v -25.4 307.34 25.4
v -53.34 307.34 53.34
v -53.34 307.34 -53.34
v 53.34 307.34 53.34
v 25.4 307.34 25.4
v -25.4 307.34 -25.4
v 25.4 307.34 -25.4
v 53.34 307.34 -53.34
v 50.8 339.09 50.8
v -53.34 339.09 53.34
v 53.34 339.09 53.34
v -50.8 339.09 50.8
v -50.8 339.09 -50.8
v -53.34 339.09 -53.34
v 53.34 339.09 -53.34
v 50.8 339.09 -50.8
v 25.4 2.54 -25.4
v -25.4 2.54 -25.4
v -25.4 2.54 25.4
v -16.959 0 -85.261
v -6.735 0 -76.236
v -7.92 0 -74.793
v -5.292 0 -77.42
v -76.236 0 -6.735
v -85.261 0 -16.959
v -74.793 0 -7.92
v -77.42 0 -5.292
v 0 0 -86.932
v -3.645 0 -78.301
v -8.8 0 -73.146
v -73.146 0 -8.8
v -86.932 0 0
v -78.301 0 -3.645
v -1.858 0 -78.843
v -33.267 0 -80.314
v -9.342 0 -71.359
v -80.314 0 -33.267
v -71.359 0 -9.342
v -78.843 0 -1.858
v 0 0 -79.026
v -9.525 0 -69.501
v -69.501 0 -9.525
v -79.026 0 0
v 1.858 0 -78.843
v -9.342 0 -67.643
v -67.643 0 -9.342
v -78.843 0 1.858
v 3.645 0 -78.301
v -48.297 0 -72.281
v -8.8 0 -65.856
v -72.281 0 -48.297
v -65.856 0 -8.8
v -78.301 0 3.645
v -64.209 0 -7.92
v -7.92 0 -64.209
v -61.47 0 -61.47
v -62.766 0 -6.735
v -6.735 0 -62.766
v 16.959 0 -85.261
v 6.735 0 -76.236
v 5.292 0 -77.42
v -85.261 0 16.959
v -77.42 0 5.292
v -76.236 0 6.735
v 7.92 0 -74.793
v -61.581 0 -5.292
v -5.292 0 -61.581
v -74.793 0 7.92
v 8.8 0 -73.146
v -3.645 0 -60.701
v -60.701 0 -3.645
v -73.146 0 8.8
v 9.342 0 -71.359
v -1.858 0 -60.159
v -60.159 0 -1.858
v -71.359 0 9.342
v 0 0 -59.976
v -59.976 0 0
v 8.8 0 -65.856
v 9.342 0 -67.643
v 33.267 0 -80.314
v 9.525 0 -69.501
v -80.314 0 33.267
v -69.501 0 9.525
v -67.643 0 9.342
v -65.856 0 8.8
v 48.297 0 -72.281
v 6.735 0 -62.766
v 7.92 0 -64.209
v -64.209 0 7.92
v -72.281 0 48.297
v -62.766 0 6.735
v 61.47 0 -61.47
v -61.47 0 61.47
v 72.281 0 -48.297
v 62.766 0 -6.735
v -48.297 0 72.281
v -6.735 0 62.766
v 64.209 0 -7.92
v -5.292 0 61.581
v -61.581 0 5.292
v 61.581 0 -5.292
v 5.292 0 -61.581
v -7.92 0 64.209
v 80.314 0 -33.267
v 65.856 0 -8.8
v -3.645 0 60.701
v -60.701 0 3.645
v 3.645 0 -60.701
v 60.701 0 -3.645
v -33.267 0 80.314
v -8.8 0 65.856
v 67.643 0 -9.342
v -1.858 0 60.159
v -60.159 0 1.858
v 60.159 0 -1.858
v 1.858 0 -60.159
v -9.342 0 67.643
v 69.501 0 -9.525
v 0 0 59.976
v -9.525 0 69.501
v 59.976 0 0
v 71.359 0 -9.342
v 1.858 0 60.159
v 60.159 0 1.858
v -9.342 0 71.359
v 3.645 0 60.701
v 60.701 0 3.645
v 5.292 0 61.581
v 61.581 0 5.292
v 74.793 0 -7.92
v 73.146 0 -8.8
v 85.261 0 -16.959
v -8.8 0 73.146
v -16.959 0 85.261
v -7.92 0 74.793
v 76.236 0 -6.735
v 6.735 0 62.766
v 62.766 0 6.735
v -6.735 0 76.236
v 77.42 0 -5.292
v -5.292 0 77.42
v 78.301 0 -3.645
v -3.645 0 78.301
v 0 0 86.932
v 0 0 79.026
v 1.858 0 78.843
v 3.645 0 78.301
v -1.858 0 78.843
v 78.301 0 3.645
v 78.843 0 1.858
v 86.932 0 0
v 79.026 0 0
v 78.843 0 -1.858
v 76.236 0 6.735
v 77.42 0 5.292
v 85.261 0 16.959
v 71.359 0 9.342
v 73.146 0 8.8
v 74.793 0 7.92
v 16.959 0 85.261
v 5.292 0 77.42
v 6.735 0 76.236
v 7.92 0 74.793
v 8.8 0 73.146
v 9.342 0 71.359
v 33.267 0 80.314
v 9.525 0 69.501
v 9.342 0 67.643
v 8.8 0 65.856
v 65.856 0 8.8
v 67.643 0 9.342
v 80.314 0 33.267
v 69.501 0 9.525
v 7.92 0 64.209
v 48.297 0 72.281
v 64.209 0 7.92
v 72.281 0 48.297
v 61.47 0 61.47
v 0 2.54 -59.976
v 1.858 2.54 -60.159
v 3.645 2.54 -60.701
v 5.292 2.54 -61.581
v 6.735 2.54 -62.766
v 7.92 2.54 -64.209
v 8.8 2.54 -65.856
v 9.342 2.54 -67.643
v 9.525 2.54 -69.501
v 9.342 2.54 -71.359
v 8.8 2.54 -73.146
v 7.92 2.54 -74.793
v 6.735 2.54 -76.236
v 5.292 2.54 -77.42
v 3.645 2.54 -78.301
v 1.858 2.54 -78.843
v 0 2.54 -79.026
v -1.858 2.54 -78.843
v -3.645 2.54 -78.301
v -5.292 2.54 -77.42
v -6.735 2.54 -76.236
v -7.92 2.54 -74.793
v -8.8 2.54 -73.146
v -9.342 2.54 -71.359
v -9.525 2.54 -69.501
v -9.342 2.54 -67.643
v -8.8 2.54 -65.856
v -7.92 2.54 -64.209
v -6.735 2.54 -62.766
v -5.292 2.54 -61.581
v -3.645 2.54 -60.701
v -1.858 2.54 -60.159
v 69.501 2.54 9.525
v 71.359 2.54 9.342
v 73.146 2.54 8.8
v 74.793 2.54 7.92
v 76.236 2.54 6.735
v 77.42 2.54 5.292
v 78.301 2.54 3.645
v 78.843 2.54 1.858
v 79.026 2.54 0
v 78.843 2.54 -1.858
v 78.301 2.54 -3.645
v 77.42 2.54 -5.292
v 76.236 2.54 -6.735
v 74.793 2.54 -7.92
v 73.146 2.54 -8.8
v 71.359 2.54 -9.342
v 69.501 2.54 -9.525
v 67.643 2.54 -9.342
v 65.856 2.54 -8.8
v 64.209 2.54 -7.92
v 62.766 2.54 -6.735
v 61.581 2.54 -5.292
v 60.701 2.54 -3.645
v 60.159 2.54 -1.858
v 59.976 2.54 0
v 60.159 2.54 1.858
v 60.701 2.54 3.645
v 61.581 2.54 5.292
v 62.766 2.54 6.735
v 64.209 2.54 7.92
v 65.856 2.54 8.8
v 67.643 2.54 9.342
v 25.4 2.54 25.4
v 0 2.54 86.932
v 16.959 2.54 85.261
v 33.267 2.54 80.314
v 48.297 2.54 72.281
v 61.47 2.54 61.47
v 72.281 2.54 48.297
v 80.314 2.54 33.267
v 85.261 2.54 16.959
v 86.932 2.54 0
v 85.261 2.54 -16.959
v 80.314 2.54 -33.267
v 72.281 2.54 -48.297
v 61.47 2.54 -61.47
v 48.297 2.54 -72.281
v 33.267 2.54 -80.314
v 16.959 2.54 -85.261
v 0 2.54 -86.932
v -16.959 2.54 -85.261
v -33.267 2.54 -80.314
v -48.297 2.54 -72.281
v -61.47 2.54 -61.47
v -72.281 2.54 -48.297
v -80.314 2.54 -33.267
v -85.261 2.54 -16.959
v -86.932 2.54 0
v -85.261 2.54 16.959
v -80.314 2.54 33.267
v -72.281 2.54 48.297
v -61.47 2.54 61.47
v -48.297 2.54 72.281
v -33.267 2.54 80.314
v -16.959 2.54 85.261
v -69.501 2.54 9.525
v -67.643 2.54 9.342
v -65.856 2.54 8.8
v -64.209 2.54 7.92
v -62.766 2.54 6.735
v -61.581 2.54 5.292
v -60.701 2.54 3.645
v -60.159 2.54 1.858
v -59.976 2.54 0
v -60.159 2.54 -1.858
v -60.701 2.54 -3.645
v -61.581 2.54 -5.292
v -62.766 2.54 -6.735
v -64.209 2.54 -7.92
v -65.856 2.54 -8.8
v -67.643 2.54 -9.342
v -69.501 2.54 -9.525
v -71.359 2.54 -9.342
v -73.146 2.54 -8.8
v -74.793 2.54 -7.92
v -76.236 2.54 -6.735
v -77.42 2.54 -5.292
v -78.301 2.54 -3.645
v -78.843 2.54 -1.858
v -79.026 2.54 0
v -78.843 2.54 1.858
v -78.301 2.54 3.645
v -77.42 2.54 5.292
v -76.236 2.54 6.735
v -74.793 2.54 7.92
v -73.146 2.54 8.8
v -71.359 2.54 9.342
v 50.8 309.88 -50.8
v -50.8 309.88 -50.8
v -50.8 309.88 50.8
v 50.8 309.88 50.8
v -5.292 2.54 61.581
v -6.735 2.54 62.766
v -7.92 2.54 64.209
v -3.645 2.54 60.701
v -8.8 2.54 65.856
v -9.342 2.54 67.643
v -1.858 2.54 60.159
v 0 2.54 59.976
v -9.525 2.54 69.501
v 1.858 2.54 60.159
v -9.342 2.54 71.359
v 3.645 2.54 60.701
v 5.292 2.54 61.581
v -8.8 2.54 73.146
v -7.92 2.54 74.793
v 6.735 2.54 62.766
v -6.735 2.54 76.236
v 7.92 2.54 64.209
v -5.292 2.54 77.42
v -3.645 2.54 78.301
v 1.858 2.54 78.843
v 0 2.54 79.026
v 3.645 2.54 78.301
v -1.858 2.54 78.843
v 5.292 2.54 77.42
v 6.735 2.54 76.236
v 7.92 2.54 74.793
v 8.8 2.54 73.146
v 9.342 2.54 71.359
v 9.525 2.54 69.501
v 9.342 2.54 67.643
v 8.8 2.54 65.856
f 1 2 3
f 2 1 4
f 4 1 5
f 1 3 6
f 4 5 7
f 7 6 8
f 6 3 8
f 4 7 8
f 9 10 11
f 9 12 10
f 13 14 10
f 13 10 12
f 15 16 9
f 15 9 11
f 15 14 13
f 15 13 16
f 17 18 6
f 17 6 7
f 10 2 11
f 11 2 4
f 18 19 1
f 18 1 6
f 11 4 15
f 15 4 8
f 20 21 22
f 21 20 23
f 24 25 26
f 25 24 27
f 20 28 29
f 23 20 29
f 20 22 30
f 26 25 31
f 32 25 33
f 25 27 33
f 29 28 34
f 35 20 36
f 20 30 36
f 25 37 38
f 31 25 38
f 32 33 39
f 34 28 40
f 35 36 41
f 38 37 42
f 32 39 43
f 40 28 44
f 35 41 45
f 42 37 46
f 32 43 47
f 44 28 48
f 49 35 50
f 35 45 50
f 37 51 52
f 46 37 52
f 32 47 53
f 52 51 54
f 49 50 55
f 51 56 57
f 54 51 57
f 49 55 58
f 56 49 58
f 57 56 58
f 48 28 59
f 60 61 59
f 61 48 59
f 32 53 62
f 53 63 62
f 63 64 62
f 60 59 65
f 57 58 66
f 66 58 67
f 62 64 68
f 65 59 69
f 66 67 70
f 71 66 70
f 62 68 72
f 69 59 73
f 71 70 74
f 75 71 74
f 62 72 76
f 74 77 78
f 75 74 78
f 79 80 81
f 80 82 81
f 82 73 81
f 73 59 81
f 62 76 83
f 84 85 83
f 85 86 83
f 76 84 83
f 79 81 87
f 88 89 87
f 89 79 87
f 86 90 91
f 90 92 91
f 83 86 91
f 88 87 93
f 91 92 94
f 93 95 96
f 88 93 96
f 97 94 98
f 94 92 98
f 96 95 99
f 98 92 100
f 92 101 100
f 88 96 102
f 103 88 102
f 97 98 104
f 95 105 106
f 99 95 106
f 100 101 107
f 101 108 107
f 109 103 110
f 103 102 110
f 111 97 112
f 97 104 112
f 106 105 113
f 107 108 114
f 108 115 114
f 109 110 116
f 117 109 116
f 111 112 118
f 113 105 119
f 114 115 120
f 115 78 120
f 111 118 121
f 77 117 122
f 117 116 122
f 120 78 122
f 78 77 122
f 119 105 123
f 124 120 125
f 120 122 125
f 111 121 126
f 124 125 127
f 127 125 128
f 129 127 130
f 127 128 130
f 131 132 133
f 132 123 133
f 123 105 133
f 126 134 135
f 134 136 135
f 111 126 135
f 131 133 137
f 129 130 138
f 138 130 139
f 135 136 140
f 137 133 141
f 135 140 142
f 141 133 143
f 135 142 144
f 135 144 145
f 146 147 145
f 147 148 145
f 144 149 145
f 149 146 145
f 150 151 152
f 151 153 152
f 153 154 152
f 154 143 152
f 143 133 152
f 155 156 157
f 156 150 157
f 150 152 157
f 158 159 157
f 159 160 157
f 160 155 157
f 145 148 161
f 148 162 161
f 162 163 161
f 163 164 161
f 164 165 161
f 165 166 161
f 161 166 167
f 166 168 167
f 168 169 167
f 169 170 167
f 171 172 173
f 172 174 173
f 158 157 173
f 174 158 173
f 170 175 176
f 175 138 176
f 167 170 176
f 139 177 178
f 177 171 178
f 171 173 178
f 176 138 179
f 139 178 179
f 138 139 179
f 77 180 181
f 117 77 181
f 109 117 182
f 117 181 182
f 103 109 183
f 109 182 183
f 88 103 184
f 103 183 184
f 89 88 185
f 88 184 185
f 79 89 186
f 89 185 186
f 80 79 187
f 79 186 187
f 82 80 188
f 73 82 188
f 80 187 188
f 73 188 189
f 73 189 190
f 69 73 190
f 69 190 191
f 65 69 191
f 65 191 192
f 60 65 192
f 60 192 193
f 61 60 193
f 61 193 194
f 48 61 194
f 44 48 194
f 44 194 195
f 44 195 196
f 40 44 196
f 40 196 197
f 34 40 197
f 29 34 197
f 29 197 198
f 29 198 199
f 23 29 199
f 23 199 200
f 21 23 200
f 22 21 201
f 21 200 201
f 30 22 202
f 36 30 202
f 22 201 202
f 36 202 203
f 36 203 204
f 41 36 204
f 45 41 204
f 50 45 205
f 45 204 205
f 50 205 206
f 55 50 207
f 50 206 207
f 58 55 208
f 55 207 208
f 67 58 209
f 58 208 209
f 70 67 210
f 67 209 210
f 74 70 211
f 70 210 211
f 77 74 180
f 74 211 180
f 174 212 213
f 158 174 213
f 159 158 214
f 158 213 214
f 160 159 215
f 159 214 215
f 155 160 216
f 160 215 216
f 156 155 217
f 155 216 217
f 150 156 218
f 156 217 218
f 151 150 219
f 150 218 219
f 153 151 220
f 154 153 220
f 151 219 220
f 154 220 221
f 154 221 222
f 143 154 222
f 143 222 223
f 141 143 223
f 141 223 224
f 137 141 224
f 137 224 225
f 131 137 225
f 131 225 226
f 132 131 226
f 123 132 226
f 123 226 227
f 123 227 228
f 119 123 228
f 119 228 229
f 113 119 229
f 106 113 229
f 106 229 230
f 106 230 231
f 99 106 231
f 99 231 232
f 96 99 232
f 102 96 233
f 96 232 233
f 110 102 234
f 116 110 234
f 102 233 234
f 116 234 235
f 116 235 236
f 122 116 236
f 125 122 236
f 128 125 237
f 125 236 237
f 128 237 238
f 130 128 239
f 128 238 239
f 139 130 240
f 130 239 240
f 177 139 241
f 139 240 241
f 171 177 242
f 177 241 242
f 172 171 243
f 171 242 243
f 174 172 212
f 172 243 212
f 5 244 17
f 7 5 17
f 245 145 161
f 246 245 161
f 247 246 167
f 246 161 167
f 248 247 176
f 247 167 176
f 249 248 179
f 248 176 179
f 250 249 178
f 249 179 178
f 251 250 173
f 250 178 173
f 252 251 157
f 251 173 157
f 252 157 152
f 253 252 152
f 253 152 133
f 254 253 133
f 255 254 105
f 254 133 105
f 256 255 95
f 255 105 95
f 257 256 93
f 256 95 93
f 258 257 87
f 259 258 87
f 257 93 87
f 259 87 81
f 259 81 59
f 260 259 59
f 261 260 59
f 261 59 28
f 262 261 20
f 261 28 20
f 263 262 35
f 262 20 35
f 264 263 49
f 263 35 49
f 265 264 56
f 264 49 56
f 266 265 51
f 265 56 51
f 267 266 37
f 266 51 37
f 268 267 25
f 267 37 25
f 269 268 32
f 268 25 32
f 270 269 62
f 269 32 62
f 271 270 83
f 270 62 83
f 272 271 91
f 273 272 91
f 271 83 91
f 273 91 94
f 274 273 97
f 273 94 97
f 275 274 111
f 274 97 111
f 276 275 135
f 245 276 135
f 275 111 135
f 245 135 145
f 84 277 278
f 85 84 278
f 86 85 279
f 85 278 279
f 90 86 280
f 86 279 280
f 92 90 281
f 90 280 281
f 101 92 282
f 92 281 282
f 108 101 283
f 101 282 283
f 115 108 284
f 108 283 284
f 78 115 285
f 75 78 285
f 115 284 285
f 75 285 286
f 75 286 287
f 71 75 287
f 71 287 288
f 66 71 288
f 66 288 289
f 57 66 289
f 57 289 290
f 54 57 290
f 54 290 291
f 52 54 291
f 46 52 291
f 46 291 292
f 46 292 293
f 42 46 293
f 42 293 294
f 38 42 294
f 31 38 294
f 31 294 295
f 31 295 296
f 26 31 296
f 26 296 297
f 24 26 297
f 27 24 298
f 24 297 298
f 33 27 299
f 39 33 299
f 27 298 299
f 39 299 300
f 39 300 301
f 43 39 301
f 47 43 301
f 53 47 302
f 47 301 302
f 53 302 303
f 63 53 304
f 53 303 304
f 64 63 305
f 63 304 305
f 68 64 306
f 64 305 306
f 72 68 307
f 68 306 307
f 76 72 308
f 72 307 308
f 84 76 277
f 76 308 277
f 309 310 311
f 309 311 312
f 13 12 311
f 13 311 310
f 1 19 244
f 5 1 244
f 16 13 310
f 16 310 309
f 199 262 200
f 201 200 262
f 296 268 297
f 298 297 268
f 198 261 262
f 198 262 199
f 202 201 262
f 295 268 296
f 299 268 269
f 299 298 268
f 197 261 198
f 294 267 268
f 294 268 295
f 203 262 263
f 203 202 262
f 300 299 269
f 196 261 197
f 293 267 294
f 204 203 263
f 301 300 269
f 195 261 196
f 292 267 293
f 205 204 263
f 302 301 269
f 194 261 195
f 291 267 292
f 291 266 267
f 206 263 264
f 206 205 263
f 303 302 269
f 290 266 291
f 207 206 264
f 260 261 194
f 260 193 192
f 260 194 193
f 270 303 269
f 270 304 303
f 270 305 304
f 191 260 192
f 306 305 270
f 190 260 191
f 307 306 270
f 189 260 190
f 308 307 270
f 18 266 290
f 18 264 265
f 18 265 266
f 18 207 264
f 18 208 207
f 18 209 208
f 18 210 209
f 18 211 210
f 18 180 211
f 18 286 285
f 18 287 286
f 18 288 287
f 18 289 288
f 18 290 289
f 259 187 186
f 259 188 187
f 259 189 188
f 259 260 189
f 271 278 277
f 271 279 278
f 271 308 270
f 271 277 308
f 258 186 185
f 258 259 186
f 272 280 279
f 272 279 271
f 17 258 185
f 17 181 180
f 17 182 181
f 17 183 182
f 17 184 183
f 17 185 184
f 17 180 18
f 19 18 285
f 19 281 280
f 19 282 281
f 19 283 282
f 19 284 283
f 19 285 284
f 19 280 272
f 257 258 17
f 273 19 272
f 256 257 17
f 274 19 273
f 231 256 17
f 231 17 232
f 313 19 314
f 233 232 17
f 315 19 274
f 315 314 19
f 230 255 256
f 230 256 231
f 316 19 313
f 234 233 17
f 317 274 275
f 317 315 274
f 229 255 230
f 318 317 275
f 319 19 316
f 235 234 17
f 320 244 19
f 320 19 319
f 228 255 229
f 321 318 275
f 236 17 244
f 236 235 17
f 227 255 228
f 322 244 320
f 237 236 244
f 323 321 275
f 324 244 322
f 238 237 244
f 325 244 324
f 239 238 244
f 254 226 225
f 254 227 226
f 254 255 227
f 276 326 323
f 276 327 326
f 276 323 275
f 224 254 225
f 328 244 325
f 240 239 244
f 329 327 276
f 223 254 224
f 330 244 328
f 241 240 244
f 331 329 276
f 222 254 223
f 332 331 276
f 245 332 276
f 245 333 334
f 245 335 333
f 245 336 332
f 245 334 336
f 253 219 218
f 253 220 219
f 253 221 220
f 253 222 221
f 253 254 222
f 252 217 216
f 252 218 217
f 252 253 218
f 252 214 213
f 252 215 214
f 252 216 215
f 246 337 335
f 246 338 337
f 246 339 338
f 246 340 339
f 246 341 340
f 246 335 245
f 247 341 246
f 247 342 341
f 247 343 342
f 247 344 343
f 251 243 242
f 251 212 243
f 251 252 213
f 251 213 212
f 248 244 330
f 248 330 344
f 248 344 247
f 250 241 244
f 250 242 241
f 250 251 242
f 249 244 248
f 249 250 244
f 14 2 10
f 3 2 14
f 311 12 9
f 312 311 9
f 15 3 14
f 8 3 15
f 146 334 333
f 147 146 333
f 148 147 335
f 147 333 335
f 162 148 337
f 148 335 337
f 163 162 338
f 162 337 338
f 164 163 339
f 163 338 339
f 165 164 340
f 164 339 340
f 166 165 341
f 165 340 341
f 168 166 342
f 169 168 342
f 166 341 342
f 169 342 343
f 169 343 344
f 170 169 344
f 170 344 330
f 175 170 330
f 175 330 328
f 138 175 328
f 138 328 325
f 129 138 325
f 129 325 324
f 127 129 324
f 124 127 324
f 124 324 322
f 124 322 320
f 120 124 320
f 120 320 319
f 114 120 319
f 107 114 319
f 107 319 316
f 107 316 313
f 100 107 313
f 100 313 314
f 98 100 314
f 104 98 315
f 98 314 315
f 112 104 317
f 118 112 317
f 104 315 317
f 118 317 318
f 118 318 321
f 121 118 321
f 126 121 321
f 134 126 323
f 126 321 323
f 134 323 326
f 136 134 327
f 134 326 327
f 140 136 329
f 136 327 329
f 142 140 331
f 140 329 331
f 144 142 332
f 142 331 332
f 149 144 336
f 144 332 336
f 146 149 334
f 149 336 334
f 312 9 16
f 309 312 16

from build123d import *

# Parameters (mm, degrees)
SKETCH1_R           = 86.9315
BOSS_EXTRUDE1_DEPTH = 2.54
SKETCH2_W           = 50.8
SKETCH2_H           = 50.8
BOSS_EXTRUDE2_DEPTH = 304.8
SKETCH3_W           = 106.68
SKETCH3_H           = 106.68
BOSS_EXTRUDE4_DEPTH = 31.75
SKETCH4_W           = 101.6
SKETCH4_H           = 101.6
CUT_EXTRUDE1_DEPTH  = 29.21
SKETCH6_R           = 9.525
CUT_EXTRUDE3_DEPTH  = 29.21


with BuildPart() as part:
    # Sketch1 → Boss-Extrude1 (new body)
    with BuildSketch(Plane(origin=(0, 0, 0), x_dir=(1, 0, 0), z_dir=(0, 1, 0))):
        with Locations(Location((0, 0, 0), (0, 0, 270))):
            Circle(SKETCH1_R)
    extrude(amount=BOSS_EXTRUDE1_DEPTH)

    # Sketch2 → Boss-Extrude2 (add)
    with BuildSketch(Plane(origin=(0, 2.54, 0), x_dir=(1, 0, 0), z_dir=(0, 1, 0))):
        Rectangle(SKETCH2_W, SKETCH2_H)
    extrude(amount=BOSS_EXTRUDE2_DEPTH)

    # Sketch3 → Boss-Extrude4 (add)
    with BuildSketch(Plane(origin=(0, 307.34, 0), x_dir=(1, 0, 0), z_dir=(0, 1, 0))):
        Rectangle(SKETCH3_W, SKETCH3_H)
    extrude(amount=BOSS_EXTRUDE4_DEPTH)

    # Sketch4 → Cut-Extrude1 (cut)
    with BuildSketch(Plane(origin=(0, 339.09, 0), x_dir=(1, 0, 0), z_dir=(0, 1, 0))):
        Rectangle(SKETCH4_W, SKETCH4_H)
    extrude(amount=-CUT_EXTRUDE1_DEPTH, mode=Mode.SUBTRACT)

    # Sketch6 → Cut-Extrude3 (cut)
    with BuildSketch(Plane(origin=(0, 2.54, 0), x_dir=(1, 0, 0), z_dir=(0, 1, 0))):
        with Locations(Location((0, 69.50075, 0), (0, 0, 270))):
            Circle(SKETCH6_R)
        with Locations(Location((69.50075, 0, 0), (0, 0, 270))):
            Circle(SKETCH6_R)
        with Locations(Location((0, -69.50075, 0), (0, 0, 270))):
            Circle(SKETCH6_R)
        with Locations(Location((-69.50075, 0, 0), (0, 0, 270))):
            Circle(SKETCH6_R)
    extrude(amount=-CUT_EXTRUDE3_DEPTH, mode=Mode.SUBTRACT)


solid = part.part
